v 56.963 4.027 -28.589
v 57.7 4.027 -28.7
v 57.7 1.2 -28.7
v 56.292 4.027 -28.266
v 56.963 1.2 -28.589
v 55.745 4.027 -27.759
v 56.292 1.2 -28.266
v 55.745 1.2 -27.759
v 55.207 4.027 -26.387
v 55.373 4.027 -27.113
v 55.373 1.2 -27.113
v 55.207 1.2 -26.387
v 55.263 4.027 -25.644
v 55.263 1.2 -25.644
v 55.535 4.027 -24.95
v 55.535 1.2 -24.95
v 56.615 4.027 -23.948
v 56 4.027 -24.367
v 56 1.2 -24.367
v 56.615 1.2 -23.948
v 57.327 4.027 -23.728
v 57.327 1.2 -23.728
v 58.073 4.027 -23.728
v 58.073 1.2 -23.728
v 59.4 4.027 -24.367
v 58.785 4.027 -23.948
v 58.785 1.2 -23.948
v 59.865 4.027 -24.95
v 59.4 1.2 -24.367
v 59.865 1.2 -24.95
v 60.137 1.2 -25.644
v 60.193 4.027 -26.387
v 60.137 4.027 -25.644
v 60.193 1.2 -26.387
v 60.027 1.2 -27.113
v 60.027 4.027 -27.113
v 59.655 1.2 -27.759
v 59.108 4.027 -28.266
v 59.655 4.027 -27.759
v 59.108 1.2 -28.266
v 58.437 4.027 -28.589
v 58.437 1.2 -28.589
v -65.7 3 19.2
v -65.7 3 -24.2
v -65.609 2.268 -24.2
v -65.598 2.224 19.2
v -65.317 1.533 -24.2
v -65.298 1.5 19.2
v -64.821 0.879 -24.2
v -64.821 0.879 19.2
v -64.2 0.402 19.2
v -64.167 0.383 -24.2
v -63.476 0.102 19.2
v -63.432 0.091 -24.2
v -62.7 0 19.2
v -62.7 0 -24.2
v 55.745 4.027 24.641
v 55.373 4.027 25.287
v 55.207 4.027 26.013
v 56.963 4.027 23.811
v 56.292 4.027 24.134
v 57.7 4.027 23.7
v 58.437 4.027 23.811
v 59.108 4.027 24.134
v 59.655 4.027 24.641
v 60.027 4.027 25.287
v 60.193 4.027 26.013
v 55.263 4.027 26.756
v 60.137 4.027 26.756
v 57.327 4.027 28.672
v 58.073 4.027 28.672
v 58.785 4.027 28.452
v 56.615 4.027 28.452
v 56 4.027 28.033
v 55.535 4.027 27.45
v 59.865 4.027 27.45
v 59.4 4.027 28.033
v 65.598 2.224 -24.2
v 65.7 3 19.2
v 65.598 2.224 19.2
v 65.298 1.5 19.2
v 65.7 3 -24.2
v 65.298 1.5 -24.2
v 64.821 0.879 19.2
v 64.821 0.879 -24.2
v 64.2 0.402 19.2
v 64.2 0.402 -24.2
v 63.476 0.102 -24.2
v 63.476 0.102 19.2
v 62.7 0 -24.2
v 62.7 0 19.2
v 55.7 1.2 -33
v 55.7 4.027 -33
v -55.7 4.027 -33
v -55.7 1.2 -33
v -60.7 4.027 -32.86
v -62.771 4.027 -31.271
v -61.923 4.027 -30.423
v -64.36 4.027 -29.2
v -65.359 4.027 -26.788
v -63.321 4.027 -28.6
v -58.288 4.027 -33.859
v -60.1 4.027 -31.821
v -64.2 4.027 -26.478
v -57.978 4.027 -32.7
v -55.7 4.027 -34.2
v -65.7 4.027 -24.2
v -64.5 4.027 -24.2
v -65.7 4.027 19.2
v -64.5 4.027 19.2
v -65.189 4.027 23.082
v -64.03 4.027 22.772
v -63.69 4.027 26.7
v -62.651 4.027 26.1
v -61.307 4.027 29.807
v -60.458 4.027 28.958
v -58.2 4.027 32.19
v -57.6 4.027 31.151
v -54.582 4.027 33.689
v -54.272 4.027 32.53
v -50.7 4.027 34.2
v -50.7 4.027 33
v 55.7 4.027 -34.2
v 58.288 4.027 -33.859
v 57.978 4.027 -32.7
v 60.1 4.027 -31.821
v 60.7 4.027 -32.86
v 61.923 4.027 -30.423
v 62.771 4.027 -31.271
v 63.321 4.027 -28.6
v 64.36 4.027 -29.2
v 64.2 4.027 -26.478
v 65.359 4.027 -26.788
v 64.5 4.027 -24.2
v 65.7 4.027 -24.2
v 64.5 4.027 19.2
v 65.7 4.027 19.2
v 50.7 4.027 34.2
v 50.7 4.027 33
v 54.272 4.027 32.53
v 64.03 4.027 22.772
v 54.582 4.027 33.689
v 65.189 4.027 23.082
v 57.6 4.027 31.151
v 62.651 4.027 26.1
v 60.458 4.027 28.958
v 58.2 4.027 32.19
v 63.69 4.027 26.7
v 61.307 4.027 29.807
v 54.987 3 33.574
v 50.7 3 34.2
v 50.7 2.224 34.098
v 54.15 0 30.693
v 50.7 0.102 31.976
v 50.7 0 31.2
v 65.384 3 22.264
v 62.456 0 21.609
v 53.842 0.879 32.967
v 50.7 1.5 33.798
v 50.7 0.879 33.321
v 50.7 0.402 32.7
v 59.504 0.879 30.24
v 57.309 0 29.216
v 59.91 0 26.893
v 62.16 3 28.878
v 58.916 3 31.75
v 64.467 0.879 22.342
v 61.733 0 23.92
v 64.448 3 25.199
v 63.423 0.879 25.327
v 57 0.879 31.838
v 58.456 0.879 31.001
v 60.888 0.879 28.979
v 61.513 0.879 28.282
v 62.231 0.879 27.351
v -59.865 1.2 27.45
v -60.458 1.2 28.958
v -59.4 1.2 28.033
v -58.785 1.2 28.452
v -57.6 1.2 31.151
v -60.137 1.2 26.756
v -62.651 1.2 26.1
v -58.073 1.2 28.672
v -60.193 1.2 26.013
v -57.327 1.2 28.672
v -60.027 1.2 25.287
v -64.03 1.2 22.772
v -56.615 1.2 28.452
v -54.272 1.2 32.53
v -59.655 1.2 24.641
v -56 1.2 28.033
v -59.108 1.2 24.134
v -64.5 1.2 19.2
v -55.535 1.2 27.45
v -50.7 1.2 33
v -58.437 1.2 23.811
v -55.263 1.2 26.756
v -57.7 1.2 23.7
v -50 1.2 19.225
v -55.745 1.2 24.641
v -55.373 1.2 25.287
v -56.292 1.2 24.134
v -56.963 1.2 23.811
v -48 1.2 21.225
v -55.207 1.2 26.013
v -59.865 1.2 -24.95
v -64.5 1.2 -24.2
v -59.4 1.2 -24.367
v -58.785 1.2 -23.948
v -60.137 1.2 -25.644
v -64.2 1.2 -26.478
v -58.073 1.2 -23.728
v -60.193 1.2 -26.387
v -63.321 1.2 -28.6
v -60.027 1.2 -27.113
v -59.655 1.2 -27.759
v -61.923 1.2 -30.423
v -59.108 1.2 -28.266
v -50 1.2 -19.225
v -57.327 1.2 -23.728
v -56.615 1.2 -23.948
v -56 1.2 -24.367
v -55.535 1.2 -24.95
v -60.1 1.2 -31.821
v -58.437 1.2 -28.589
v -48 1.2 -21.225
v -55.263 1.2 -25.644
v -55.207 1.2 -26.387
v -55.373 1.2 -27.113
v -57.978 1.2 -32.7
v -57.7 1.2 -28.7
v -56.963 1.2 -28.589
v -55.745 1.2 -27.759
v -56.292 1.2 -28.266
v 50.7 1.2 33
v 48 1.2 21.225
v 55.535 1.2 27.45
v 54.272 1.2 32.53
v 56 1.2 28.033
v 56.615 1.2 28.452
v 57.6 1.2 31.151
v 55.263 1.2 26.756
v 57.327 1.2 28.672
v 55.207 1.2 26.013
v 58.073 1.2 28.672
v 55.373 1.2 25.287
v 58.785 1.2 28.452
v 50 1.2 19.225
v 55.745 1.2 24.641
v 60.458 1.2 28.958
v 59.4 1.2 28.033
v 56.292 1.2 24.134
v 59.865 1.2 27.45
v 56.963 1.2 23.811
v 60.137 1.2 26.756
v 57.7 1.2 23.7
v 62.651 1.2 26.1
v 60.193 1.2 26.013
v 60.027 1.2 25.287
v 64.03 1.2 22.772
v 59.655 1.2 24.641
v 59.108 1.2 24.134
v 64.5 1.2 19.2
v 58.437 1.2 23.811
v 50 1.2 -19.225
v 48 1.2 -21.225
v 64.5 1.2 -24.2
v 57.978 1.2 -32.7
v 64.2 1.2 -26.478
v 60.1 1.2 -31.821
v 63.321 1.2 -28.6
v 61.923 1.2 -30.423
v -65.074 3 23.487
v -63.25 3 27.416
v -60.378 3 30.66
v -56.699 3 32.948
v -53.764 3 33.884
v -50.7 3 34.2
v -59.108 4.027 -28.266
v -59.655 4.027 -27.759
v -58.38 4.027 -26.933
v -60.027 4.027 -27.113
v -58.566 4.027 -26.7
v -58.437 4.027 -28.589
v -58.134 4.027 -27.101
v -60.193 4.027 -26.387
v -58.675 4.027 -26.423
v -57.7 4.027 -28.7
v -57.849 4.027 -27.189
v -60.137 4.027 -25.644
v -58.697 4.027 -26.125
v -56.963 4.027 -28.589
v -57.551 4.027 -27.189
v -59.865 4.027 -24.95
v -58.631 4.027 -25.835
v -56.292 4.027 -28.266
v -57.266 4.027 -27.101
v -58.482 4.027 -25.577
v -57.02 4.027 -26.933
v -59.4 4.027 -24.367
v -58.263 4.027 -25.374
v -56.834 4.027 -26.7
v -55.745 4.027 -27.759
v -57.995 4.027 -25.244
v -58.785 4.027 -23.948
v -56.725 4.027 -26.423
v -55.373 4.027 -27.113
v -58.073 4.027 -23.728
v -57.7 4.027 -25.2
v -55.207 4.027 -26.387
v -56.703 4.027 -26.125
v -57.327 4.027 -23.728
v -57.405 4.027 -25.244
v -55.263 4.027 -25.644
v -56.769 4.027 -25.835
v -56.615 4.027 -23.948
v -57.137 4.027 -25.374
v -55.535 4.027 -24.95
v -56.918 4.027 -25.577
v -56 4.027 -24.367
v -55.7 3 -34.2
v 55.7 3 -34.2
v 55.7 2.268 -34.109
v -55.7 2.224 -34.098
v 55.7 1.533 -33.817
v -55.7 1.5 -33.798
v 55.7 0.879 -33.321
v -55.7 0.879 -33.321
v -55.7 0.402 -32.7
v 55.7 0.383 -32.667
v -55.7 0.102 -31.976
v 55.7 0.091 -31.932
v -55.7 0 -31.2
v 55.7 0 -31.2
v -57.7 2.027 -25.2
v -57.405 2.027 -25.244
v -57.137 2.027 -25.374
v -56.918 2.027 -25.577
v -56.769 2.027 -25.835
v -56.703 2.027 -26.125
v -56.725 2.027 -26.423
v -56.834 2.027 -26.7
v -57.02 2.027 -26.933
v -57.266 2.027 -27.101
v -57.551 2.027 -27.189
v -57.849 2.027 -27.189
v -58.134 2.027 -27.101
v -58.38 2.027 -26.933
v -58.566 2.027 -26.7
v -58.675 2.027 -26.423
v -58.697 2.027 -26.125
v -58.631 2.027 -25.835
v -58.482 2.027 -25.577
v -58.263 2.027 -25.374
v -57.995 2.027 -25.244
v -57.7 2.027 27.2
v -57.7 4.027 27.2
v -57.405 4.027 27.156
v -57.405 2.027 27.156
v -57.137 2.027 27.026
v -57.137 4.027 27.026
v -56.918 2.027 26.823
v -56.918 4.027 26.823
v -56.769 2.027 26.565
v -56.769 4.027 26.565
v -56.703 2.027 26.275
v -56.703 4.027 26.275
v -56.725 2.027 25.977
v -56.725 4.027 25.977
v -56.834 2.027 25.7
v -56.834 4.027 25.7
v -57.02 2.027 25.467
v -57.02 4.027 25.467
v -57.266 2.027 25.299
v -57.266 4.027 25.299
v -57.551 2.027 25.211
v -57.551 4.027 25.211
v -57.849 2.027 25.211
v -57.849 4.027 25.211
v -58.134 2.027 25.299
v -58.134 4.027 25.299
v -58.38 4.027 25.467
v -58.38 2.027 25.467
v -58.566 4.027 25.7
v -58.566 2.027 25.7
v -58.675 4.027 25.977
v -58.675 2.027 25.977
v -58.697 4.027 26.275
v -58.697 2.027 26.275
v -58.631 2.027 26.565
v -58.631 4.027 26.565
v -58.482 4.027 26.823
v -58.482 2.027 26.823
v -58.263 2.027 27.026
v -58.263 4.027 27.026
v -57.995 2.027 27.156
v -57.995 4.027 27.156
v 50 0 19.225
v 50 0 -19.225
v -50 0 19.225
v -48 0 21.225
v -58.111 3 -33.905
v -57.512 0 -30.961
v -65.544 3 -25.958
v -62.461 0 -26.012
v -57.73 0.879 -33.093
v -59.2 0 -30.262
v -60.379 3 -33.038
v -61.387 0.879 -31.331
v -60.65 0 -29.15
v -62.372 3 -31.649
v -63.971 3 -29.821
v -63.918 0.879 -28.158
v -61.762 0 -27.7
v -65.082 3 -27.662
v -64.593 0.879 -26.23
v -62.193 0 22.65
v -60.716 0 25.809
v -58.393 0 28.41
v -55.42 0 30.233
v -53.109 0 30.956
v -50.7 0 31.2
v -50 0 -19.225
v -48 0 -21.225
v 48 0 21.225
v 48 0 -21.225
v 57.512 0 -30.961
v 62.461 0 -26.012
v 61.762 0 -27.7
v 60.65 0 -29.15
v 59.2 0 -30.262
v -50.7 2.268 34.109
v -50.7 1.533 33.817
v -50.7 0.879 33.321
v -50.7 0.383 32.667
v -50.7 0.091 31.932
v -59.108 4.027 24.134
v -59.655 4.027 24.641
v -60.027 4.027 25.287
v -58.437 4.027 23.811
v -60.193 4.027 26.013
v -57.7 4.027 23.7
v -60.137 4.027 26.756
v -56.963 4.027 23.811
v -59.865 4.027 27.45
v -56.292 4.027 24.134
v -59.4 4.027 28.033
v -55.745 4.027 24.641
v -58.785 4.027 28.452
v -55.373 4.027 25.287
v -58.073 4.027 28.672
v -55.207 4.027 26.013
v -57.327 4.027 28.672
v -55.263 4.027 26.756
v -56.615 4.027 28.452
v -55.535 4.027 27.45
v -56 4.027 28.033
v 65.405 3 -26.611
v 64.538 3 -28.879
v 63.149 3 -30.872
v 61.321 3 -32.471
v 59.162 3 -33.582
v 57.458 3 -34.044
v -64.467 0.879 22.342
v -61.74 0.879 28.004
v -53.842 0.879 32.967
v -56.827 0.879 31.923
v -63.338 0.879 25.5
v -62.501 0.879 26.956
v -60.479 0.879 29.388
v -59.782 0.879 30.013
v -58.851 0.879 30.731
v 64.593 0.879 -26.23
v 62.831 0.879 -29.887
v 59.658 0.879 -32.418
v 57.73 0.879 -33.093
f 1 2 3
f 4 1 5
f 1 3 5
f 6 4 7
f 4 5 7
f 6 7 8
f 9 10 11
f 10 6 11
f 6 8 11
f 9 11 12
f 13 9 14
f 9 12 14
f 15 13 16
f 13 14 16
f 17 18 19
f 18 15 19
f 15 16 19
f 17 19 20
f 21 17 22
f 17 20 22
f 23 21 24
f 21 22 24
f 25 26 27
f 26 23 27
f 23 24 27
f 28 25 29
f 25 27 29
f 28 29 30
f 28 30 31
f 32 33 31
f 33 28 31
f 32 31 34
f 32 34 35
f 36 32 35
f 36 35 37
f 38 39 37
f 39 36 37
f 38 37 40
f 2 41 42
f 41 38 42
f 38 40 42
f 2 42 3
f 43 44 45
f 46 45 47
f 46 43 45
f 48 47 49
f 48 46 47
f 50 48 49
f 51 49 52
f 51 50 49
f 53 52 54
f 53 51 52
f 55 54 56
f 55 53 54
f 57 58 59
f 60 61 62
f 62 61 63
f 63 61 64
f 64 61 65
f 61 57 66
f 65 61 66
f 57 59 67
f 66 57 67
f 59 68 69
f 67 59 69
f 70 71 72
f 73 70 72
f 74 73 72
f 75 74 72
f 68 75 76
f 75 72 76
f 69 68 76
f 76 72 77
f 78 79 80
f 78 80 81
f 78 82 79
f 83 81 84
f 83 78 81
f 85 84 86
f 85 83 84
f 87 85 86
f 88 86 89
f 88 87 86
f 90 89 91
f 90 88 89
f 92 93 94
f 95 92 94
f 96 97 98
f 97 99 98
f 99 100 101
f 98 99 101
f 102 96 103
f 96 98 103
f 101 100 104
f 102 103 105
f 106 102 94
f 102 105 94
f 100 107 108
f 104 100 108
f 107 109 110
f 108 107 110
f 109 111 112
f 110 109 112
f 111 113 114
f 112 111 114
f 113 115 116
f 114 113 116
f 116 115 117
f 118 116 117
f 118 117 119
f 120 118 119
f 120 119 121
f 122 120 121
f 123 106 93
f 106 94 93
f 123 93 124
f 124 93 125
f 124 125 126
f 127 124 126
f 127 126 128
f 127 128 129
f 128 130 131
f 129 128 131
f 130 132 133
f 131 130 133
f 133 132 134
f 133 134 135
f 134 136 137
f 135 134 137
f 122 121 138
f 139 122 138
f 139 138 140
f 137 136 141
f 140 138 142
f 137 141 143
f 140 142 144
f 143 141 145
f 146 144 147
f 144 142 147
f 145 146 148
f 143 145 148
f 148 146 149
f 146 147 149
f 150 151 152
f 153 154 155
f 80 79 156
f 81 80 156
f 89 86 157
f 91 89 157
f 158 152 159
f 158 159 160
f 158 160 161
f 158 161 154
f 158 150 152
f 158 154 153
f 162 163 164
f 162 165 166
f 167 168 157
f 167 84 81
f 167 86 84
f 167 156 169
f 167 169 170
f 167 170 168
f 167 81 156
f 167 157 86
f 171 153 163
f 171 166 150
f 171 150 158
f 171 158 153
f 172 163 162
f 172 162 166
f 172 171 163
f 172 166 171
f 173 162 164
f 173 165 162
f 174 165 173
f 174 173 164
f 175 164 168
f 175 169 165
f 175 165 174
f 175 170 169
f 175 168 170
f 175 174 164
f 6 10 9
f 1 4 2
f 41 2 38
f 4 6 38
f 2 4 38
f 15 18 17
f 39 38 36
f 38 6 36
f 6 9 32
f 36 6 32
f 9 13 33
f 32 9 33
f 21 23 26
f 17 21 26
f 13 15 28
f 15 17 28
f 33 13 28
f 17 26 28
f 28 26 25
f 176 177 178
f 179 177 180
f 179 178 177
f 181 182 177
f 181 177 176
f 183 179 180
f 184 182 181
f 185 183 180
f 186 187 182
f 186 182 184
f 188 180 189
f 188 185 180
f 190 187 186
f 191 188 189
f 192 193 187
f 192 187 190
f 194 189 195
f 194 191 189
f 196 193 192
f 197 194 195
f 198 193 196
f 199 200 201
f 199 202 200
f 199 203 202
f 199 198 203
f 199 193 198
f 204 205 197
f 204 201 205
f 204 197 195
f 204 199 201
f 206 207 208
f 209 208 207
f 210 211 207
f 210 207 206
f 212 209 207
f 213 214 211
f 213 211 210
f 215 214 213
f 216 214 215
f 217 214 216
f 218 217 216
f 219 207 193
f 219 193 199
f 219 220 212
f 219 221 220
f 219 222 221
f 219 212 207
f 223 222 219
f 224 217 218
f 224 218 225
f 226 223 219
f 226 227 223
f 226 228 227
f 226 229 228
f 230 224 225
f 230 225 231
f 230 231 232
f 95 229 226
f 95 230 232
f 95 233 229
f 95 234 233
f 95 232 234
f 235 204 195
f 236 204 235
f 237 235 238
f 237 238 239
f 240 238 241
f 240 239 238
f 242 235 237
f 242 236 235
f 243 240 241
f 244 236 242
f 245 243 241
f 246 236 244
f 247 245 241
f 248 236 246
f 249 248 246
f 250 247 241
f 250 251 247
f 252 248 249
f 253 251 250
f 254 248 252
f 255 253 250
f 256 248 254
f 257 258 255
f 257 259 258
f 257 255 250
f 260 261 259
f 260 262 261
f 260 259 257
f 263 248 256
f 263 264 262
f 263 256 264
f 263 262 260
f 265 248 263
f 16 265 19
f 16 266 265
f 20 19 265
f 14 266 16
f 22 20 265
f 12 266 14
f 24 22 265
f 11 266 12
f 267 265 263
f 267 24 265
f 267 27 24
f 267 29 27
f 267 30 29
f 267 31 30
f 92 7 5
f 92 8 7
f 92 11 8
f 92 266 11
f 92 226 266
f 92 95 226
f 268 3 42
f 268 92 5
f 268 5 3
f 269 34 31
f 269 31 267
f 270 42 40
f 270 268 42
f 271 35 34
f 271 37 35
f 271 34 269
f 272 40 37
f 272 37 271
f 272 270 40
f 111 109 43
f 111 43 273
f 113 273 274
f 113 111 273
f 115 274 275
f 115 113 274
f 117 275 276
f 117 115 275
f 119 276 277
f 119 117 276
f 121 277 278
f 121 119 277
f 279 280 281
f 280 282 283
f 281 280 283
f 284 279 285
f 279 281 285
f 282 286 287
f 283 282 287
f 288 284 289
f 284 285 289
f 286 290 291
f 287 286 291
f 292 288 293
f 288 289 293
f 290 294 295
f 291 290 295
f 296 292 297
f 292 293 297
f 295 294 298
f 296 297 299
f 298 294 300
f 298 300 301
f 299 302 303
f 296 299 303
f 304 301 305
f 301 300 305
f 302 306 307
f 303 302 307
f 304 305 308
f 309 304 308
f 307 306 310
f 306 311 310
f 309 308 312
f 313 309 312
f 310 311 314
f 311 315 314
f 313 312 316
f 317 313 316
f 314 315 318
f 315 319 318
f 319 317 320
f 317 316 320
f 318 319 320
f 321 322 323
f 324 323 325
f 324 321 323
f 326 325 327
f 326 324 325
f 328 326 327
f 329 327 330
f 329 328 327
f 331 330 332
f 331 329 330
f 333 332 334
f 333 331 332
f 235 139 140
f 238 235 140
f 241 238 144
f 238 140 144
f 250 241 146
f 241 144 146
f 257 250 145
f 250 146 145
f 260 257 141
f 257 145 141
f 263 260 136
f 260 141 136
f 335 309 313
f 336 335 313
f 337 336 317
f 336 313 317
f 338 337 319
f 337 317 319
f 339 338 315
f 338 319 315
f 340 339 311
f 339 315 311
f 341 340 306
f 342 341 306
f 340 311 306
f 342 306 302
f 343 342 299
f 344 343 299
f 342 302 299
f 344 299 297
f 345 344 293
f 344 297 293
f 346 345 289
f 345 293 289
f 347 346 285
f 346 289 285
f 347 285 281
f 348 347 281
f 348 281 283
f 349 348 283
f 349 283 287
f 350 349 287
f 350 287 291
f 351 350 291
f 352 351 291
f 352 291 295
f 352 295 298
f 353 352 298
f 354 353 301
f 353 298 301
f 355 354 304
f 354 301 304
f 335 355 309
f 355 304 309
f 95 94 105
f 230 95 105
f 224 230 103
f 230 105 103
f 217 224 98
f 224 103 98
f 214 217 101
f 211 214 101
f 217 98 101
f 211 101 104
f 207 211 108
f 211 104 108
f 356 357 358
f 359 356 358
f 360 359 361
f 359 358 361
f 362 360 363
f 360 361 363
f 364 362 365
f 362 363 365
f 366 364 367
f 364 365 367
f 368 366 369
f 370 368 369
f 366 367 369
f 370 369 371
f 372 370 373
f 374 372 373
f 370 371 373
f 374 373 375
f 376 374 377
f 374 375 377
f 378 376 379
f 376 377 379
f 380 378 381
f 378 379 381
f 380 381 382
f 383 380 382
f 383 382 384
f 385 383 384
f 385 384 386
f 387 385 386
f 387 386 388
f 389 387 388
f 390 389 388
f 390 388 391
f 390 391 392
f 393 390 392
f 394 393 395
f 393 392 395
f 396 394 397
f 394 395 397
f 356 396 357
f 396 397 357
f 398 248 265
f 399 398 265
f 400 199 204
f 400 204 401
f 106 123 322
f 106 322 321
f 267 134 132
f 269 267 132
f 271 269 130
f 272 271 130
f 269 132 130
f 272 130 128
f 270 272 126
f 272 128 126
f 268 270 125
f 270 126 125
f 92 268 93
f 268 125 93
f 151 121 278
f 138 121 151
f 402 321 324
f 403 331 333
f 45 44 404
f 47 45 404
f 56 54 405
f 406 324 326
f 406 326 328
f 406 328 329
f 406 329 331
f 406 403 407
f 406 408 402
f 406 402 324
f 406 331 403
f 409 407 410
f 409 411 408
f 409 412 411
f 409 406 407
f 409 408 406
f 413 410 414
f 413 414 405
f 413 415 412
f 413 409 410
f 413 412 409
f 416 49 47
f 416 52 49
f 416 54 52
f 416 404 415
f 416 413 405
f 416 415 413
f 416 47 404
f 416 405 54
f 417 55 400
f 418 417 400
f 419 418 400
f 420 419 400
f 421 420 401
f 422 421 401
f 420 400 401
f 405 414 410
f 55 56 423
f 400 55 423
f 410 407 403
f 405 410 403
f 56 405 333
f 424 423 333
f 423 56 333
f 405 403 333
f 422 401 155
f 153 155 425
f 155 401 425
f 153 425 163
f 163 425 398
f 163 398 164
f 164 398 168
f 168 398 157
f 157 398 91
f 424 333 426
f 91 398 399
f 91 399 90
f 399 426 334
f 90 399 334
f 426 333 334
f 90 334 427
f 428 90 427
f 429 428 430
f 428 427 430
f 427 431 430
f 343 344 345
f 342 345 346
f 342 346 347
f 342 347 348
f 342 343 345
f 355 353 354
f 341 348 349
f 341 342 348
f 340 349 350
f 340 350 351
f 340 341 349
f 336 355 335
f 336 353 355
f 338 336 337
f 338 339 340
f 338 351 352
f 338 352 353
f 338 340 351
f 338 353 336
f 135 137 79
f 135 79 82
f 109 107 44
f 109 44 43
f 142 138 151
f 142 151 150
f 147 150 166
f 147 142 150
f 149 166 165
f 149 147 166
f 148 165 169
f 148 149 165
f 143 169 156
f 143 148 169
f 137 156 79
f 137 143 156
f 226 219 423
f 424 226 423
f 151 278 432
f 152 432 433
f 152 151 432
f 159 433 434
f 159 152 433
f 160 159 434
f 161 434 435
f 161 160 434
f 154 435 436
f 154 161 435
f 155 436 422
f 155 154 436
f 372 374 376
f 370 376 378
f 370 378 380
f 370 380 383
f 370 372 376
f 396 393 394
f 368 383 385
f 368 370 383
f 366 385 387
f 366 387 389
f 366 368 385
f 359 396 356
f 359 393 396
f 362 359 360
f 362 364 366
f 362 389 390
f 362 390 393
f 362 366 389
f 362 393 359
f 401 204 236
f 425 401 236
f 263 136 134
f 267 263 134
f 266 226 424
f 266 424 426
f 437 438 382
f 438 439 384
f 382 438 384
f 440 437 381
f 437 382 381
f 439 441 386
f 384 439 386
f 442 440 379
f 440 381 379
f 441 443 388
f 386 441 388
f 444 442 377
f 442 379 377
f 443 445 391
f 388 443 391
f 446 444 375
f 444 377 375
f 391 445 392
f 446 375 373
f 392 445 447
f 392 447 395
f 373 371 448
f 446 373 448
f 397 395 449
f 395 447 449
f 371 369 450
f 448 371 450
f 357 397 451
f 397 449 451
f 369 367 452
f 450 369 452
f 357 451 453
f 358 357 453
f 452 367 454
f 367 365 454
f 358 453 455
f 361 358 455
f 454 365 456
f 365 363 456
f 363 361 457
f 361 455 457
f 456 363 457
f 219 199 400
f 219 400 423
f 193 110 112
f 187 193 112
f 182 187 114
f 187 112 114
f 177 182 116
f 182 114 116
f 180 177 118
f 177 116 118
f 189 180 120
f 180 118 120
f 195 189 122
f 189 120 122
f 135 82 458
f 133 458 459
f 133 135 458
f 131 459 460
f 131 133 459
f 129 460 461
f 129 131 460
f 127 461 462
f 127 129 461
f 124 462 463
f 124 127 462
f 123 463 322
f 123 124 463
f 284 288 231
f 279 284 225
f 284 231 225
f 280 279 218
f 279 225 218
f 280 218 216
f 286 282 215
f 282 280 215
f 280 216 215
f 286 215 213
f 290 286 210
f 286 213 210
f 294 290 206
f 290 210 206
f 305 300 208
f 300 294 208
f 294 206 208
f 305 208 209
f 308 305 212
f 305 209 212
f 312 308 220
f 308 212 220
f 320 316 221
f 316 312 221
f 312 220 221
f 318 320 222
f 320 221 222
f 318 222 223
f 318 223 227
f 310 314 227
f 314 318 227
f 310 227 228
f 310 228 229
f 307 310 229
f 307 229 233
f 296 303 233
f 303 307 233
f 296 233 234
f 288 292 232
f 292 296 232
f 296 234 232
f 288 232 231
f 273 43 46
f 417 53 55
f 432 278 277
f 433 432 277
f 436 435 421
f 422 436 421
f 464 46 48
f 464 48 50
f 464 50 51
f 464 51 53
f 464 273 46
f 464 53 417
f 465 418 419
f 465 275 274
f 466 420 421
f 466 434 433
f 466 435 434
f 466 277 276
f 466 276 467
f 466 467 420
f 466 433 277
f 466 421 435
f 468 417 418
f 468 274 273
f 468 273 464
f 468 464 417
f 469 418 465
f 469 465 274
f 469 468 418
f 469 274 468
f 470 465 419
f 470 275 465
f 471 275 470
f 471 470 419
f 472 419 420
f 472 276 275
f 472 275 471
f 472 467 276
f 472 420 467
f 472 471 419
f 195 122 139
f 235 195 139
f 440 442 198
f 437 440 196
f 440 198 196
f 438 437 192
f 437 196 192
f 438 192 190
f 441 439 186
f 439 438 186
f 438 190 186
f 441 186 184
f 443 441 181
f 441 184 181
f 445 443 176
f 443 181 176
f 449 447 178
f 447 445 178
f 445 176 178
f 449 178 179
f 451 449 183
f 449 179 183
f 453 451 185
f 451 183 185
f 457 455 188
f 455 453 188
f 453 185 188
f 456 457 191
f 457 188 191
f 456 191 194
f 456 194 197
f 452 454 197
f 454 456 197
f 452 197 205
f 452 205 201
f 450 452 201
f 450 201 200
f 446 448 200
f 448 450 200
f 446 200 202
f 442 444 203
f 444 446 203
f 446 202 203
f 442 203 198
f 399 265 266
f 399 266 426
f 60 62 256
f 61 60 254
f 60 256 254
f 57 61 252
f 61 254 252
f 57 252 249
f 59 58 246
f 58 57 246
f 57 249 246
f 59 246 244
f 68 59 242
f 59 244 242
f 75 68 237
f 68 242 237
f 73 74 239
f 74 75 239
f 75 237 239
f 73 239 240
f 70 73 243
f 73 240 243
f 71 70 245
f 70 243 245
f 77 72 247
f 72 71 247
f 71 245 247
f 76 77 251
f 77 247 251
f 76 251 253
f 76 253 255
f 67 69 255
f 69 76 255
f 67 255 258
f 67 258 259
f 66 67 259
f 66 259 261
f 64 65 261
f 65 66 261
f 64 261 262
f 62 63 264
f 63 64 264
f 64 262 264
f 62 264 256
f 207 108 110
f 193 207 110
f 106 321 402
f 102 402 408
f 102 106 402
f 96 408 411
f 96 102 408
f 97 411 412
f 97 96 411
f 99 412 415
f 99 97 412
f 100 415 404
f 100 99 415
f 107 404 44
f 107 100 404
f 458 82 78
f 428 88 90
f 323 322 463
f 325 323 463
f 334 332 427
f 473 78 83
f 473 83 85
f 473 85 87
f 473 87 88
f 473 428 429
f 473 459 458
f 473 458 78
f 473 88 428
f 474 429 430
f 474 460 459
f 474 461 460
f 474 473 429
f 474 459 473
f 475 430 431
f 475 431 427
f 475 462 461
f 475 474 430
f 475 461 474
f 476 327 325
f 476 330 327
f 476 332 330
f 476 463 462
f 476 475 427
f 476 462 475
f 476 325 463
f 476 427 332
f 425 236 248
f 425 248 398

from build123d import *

# Parameters (mm, degrees)
ESBO_O1_W                    = 131.4
ESBO_O1_H                    = 68.4
BASE_DEPTH                   = 1.2
FILETE1_R                    = 15
FILETE2_R                    = 15
FILETE3_R                    = 10
FILETE4_R                    = 10
PAREDES_START                = 10
PAREDES_DEPTH                = 10
FILETE_DA_BASE_R             = 3
ESBO_O6_R                    = 2.5
SUPORTE_DOS_PARAFUSOS_DEPTH  = 10
ESBO_O7_R                    = 1
FURO_PARA_OS_PARAFUSOS_DEPTH = 6
ESBO_O8_W                    = 100
ESBO_O8_H                    = 42.449361702
CORTE_EXTRUS_O1_DEPTH        = 10
ESBO_O9_W                    = 134.994270452
ESBO_O9_H                    = 14.346821692
CORTE_EXTRUS_O2_DEPTH        = 96.501256536
CHANFRO8_SIZE                = 2
CHANFRO9_SIZE                = 2
CHANFRO10_SIZE               = 2
CHANFRO11_SIZE               = 2
ESBO_O10_R                   = 1
CORTE_EXTRUS_O4_DEPTH        = 2


with BuildPart() as part:
    # Esboço1 → Base (new body)
    with BuildSketch(Plane(origin=(0, 0, 0), x_dir=(1, 0, 0), z_dir=(0, 1, 0))):
        Rectangle(ESBO_O1_W, ESBO_O1_H)
    extrude(amount=BASE_DEPTH)

    # Filete1
    filete1_edges = [part.edges().sort_by_distance(p)[0] for p in [
        (65.7, 0.6, 34.2),
    ]]
    fillet(filete1_edges, radius=FILETE1_R)

    # Filete2
    filete2_edges = [part.edges().sort_by_distance(p)[0] for p in [
        (-65.7, 0.6, 34.2),
    ]]
    fillet(filete2_edges, radius=FILETE2_R)

    # Filete3
    filete3_edges = [part.edges().sort_by_distance(p)[0] for p in [
        (65.7, 0.6, -34.2),
    ]]
    fillet(filete3_edges, radius=FILETE3_R)

    # Filete4
    filete4_edges = [part.edges().sort_by_distance(p)[0] for p in [
        (-65.7, 0.6, -34.2),
    ]]
    fillet(filete4_edges, radius=FILETE4_R)

    # Esboço5 → Paredes (add)
    with BuildSketch(Plane(origin=(0, 1.2, 0), x_dir=(1, 0, 0), z_dir=(0, 1, 0)).offset(PAREDES_START)):
        with BuildLine():
            Line((55.7, 34.2), (-55.7, 34.2))
            ThreePointArc((-55.7, 34.2), (-62.771067812, 31.271067812), (-65.7, 24.2))
            Line((-65.7, 24.2), (-65.7, -19.2))
            ThreePointArc((-65.7, -19.2), (-61.306601718, -29.806601718), (-50.7, -34.2))
            Line((-50.7, -34.2), (50.7, -34.2))
            ThreePointArc((50.7, -34.2), (61.306601718, -29.806601718), (65.7, -19.2))
            Line((65.7, -19.2), (65.7, 24.2))
            ThreePointArc((65.7, 24.2), (62.771067812, 31.271067812), (55.7, 34.2))
        make_face()
        with BuildLine():
            Line((55.7, 33), (-55.7, 33))
            ThreePointArc((-55.7, 33), (-61.922539674, 30.422539674), (-64.5, 24.2))
            Line((-64.5, 24.2), (-64.5, -19.2))
            ThreePointArc((-64.5, -19.2), (-60.45807358, -28.95807358), (-50.7, -33))
            Line((-50.7, -33), (50.7, -33))
            ThreePointArc((50.7, -33), (60.45807358, -28.95807358), (64.5, -19.2))
            Line((64.5, -19.2), (64.5, 24.2))
            ThreePointArc((64.5, 24.2), (61.922539674, 30.422539674), (55.7, 33))
        make_face(mode=Mode.SUBTRACT)
    extrude(amount=-PAREDES_DEPTH)

    # Filete da base
    filete_da_base_edges = [part.edges().sort_by_distance(p)[0] for p in [
        (65.7, 0, -2.5),
        (61.306601718, 0, 29.806601718),
        (0, 0, 34.2),
        (-61.306601718, 0, 29.806601718),
        (0, 0, -34.2),
        (62.771067812, 0, -31.271067812),
        (-65.7, 0, -2.5),
        (-62.771067812, 0, -31.271067812),
    ]]
    fillet(filete_da_base_edges, radius=FILETE_DA_BASE_R)

    # Esboço6 → Suporte dos parafusos (add)
    with BuildSketch(Plane(origin=(0, 1.2, 0), x_dir=(1, 0, 0), z_dir=(0, 1, 0))):
        with Locations(Location((-57.7, 26.2, 0), (0, 0, 90))):
            Circle(ESBO_O6_R)
        with Locations(Location((-57.7, -26.2, 0), (0, 0, 90))):
            Circle(ESBO_O6_R)
        with Locations(Location((57.7, 26.2, 0), (0, 0, 90))):
            Circle(ESBO_O6_R)
        with Locations(Location((57.7, -26.2, 0), (0, 0, 90))):
            Circle(ESBO_O6_R)
    extrude(amount=SUPORTE_DOS_PARAFUSOS_DEPTH)

    # Esboço7 → Furo para os parafusos (cut)
    with BuildSketch(Plane(origin=(0, 11.2, 0), x_dir=(1, 0, 0), z_dir=(0, 1, 0))):
        with Locations(Location((-57.7, 26.2, 0), (0, 0, 270))):
            Circle(ESBO_O7_R)
        with Locations(Location((-57.7, -26.2, 0), (0, 0, 270))):
            Circle(ESBO_O7_R)
        with Locations(Location((57.7, -26.2, 0), (0, 0, 270))):
            Circle(ESBO_O7_R)
        with Locations(Location((57.7, 26.2, 0), (0, 0, 270))):
            Circle(ESBO_O7_R)
    extrude(amount=-FURO_PARA_OS_PARAFUSOS_DEPTH, mode=Mode.SUBTRACT)

    # Esboço8 → Corte-extrusão1 (cut)
    with BuildSketch(Plane(origin=(0, 1.2, 0), x_dir=(1, 0, 0), z_dir=(0, 1, 0))):
        Rectangle(ESBO_O8_W, ESBO_O8_H)
    extrude(amount=-CORTE_EXTRUS_O1_DEPTH, mode=Mode.SUBTRACT)

    # Esboço9 → Corte-extrusão2 (cut, through all)
    with BuildSketch(Plane.XY.offset(34.2)):
        with Locations((0, 11.2)):
            Rectangle(ESBO_O9_W, ESBO_O9_H)
    extrude(amount=-CORTE_EXTRUS_O2_DEPTH, mode=Mode.SUBTRACT)

    # Chanfro8
    chanfro8_edges = [part.edges().sort_by_distance(p)[0] for p in [
        (-50, 0.6, -21.224680851),
    ]]
    chamfer(chanfro8_edges, length=CHANFRO8_SIZE)

    # Chanfro9
    chanfro9_edges = [part.edges().sort_by_distance(p)[0] for p in [
        (50, 0.6, -21.224680851),
    ]]
    chamfer(chanfro9_edges, length=CHANFRO9_SIZE)

    # Chanfro10
    chanfro10_edges = [part.edges().sort_by_distance(p)[0] for p in [
        (50, 0.6, 21.224680851),
    ]]
    chamfer(chanfro10_edges, length=CHANFRO10_SIZE)

    # Chanfro11
    chanfro11_edges = [part.edges().sort_by_distance(p)[0] for p in [
        (-50, 0.6, 21.224680851),
    ]]
    chamfer(chanfro11_edges, length=CHANFRO11_SIZE)

    # Esboço10 → Corte-extrusão4 (cut)
    with BuildSketch(Plane(origin=(0, 4.026589154, 0), x_dir=(1, 0, 0), z_dir=(0, 1, 0))):
        with Locations(Location((-57.7, 26.2, 0), (0, 0, 270))):
            Circle(ESBO_O10_R)
        with Locations(Location((-57.7, -26.2, 0), (0, 0, 270))):
            Circle(ESBO_O10_R)
    extrude(amount=-CORTE_EXTRUS_O4_DEPTH, mode=Mode.SUBTRACT)


solid = part.part
